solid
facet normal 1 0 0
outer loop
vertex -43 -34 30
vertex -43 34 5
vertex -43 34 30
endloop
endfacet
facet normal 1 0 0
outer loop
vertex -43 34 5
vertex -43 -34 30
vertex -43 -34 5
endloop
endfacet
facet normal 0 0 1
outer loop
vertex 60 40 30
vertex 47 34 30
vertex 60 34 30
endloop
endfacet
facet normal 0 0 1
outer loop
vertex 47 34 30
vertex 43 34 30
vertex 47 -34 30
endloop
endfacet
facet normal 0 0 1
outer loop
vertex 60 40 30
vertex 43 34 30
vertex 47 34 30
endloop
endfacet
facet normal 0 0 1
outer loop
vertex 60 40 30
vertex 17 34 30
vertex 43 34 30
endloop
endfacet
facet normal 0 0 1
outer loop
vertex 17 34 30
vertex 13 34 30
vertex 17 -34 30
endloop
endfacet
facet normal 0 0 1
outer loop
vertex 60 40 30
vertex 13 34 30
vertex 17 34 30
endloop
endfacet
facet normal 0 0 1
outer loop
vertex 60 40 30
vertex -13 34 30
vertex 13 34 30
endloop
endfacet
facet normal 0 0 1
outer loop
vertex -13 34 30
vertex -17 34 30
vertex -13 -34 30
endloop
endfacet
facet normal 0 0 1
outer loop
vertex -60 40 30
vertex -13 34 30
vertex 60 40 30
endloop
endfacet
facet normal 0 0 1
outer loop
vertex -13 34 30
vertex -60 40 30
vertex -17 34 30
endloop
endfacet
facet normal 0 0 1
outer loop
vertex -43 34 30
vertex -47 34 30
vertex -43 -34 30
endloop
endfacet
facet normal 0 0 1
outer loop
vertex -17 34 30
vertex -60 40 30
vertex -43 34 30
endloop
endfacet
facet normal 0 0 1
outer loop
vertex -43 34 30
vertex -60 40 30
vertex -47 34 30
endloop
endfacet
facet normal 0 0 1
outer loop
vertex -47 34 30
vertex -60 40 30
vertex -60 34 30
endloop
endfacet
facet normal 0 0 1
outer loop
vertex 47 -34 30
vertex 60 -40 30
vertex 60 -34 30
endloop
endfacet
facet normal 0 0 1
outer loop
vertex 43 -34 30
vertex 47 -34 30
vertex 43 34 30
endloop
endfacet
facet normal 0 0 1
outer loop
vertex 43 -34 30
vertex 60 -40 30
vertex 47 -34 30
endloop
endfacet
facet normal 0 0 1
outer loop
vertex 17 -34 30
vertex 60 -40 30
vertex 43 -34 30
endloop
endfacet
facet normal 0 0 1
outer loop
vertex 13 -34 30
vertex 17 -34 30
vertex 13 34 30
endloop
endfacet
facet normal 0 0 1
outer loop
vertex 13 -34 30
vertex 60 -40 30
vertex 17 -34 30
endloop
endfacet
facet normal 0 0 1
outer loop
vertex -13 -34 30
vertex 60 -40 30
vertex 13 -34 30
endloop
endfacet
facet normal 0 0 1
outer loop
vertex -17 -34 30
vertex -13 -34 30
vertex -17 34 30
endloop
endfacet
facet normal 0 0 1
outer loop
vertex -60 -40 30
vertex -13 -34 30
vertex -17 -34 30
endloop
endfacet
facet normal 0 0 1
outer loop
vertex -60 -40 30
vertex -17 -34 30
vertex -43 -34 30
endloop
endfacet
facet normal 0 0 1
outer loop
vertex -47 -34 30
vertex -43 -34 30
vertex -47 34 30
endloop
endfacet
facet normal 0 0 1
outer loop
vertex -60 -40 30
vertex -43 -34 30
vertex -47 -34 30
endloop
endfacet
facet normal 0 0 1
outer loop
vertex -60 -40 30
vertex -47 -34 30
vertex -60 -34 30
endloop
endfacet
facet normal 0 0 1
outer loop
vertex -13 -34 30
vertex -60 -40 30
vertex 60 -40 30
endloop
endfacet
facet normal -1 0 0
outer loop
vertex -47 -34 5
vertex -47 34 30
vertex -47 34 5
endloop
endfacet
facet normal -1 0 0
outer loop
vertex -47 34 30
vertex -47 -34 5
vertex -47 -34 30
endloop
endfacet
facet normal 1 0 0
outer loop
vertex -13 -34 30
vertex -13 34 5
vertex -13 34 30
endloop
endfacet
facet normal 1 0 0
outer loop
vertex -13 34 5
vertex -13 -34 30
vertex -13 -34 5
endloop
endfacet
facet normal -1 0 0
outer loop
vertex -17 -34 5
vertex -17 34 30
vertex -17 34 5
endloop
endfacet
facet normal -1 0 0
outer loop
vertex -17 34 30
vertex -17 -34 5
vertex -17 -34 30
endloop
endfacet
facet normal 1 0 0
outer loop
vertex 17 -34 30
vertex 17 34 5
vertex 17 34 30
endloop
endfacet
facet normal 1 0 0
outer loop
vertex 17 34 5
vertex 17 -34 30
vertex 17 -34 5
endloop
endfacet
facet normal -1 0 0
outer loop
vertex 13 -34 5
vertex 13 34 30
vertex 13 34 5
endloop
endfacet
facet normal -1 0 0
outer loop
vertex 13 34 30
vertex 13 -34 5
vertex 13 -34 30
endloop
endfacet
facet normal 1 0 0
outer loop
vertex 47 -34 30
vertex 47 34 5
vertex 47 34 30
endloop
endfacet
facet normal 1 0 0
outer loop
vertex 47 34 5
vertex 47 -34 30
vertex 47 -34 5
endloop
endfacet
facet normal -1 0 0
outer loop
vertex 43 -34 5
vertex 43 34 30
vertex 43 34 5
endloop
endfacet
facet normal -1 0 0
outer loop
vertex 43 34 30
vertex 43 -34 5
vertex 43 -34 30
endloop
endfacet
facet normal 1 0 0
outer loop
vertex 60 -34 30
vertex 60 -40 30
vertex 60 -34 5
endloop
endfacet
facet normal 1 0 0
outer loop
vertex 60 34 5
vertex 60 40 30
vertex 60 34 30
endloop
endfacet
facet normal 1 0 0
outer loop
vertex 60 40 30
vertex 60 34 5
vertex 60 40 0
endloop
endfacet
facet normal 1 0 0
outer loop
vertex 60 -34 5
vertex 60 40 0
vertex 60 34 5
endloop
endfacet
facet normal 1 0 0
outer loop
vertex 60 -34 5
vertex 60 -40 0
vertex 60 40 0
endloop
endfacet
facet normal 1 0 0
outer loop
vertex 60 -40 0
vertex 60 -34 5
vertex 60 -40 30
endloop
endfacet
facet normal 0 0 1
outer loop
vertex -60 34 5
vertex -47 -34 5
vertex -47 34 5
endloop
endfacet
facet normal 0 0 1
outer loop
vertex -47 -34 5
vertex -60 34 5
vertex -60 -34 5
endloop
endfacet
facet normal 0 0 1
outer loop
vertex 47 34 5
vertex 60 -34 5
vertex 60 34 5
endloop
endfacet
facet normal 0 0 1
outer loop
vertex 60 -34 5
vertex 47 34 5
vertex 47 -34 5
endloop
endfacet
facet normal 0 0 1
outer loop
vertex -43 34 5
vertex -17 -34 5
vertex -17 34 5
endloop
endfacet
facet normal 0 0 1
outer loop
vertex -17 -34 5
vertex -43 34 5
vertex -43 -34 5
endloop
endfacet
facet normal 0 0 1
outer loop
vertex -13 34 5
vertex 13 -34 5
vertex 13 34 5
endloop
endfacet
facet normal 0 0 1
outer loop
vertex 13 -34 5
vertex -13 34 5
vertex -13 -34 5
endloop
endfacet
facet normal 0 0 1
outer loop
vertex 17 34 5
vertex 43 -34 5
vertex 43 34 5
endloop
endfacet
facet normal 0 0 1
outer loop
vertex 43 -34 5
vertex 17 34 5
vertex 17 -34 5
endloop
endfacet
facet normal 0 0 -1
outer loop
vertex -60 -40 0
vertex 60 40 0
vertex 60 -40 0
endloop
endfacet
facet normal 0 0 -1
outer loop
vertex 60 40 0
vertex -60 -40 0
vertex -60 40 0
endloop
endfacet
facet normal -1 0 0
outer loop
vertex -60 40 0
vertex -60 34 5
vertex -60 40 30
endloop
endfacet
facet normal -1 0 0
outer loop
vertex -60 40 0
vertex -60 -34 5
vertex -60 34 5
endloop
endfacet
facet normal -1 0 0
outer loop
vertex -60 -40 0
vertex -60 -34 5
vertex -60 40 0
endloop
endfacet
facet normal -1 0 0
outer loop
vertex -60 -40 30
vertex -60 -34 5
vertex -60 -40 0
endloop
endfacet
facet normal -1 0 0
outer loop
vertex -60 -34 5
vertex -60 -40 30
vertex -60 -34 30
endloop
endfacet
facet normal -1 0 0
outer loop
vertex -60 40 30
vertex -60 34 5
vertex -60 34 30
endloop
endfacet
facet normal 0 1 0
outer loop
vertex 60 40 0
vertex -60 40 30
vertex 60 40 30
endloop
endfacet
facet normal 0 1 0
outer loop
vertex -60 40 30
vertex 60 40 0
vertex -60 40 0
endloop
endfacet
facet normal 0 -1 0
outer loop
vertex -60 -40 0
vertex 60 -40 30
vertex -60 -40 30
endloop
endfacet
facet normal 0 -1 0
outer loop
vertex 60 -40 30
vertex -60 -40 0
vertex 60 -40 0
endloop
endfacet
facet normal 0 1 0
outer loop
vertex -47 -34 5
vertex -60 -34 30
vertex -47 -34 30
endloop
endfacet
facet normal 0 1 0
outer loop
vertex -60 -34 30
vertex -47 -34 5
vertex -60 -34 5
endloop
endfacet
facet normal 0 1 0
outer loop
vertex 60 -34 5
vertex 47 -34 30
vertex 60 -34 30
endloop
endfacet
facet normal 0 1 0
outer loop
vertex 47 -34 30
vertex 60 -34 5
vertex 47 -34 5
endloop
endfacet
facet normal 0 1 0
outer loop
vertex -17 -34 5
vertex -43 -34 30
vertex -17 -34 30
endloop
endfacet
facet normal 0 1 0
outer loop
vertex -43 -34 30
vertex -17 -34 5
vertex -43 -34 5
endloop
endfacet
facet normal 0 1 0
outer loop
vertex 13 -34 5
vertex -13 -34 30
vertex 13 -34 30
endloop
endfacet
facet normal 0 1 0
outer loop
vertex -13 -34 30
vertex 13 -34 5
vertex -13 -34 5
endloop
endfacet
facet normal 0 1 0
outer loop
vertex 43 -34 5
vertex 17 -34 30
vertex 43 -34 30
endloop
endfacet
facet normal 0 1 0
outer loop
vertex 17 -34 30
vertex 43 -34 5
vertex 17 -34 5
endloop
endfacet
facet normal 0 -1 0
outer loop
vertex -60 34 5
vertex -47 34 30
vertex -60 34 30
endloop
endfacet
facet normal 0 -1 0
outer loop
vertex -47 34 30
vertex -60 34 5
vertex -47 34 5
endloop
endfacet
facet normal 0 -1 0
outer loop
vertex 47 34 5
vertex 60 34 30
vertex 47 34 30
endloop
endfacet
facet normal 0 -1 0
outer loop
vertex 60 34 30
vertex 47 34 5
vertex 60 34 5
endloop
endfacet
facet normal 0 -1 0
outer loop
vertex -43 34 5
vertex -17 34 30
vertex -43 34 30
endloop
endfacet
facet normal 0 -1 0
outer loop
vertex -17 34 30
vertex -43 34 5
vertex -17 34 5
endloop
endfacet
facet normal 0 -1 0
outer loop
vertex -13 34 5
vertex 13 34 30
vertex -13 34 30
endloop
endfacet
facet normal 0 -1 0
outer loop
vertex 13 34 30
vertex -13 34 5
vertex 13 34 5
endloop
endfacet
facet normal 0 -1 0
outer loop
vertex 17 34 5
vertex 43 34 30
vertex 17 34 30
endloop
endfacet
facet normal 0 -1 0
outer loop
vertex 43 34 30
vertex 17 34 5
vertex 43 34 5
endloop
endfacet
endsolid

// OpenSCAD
$fn = 32;

// ----------------------------------------------------------------------
// Rib frame 120 x 80 x 30
// 4 ribs at 30 mm pitch
// ----------------------------------------------------------------------

// --- parameters (mm) ---
frame = [120, 80, 5];  // base plate size (x, y, z)
rail_w = 6;            // side rail width
ribs = 4;              // number of ribs
rib_t = 4;             // rib thickness
rib_h = 25;            // rib height above the base plate
pitch = 30;            // pitch between rib centres

// --- derived feature positions (mm) ---
span = (ribs - 1) * pitch;          // = 90   distance between the outer ribs
origin_x = -span / 2;               // = -45   X of the first rib
rib_len = frame[1] - 2 * rail_w + 2;  // = 70   rib length, 1 mm into each rail
feature_centers = [
  [origin_x + 0 * pitch, 0],
  [origin_x + 1 * pitch, 0],
  [origin_x + 2 * pitch, 0],
  [origin_x + 3 * pitch, 0]
];   // rib centre line, drives the rib loop

// base plate, two side rails, then the ribs read straight off feature_centers
union() {
  translate([-frame[0] / 2, -frame[1] / 2, 0]) cube(frame);
  translate([-frame[0] / 2, -frame[1] / 2, 0]) cube([frame[0], rail_w, frame[2] + rib_h]);
  translate([-frame[0] / 2, frame[1] / 2 - rail_w, 0]) cube([frame[0], rail_w, frame[2] + rib_h]);
  for (centre = feature_centers)
    translate([centre[0] - rib_t / 2, centre[1] - rib_len / 2, frame[2] - 1])
      cube([rib_t, rib_len, rib_h + 1]);
}
